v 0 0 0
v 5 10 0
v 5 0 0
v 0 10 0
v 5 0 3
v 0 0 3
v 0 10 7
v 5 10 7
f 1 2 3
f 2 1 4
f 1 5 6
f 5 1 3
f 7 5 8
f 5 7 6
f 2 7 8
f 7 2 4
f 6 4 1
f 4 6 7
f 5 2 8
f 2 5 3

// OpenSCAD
module prism(l, w, h1, h2){
       polyhedron(
               points=[[0,0,0], [l,0,0], [l,w,0], [0,w,0],
                        [0,0,h1], [l,0,h1], [0,w,h2], [l,w,h2]],
               faces=[[0,1,2,3], [1, 0, 4, 5], [5, 4, 6, 7], [7, 6, 3, 2],
                        [4, 0, 3, 6], [2, 1, 5, 7]]
               );
}

prism(5, 10, 3, 7);
